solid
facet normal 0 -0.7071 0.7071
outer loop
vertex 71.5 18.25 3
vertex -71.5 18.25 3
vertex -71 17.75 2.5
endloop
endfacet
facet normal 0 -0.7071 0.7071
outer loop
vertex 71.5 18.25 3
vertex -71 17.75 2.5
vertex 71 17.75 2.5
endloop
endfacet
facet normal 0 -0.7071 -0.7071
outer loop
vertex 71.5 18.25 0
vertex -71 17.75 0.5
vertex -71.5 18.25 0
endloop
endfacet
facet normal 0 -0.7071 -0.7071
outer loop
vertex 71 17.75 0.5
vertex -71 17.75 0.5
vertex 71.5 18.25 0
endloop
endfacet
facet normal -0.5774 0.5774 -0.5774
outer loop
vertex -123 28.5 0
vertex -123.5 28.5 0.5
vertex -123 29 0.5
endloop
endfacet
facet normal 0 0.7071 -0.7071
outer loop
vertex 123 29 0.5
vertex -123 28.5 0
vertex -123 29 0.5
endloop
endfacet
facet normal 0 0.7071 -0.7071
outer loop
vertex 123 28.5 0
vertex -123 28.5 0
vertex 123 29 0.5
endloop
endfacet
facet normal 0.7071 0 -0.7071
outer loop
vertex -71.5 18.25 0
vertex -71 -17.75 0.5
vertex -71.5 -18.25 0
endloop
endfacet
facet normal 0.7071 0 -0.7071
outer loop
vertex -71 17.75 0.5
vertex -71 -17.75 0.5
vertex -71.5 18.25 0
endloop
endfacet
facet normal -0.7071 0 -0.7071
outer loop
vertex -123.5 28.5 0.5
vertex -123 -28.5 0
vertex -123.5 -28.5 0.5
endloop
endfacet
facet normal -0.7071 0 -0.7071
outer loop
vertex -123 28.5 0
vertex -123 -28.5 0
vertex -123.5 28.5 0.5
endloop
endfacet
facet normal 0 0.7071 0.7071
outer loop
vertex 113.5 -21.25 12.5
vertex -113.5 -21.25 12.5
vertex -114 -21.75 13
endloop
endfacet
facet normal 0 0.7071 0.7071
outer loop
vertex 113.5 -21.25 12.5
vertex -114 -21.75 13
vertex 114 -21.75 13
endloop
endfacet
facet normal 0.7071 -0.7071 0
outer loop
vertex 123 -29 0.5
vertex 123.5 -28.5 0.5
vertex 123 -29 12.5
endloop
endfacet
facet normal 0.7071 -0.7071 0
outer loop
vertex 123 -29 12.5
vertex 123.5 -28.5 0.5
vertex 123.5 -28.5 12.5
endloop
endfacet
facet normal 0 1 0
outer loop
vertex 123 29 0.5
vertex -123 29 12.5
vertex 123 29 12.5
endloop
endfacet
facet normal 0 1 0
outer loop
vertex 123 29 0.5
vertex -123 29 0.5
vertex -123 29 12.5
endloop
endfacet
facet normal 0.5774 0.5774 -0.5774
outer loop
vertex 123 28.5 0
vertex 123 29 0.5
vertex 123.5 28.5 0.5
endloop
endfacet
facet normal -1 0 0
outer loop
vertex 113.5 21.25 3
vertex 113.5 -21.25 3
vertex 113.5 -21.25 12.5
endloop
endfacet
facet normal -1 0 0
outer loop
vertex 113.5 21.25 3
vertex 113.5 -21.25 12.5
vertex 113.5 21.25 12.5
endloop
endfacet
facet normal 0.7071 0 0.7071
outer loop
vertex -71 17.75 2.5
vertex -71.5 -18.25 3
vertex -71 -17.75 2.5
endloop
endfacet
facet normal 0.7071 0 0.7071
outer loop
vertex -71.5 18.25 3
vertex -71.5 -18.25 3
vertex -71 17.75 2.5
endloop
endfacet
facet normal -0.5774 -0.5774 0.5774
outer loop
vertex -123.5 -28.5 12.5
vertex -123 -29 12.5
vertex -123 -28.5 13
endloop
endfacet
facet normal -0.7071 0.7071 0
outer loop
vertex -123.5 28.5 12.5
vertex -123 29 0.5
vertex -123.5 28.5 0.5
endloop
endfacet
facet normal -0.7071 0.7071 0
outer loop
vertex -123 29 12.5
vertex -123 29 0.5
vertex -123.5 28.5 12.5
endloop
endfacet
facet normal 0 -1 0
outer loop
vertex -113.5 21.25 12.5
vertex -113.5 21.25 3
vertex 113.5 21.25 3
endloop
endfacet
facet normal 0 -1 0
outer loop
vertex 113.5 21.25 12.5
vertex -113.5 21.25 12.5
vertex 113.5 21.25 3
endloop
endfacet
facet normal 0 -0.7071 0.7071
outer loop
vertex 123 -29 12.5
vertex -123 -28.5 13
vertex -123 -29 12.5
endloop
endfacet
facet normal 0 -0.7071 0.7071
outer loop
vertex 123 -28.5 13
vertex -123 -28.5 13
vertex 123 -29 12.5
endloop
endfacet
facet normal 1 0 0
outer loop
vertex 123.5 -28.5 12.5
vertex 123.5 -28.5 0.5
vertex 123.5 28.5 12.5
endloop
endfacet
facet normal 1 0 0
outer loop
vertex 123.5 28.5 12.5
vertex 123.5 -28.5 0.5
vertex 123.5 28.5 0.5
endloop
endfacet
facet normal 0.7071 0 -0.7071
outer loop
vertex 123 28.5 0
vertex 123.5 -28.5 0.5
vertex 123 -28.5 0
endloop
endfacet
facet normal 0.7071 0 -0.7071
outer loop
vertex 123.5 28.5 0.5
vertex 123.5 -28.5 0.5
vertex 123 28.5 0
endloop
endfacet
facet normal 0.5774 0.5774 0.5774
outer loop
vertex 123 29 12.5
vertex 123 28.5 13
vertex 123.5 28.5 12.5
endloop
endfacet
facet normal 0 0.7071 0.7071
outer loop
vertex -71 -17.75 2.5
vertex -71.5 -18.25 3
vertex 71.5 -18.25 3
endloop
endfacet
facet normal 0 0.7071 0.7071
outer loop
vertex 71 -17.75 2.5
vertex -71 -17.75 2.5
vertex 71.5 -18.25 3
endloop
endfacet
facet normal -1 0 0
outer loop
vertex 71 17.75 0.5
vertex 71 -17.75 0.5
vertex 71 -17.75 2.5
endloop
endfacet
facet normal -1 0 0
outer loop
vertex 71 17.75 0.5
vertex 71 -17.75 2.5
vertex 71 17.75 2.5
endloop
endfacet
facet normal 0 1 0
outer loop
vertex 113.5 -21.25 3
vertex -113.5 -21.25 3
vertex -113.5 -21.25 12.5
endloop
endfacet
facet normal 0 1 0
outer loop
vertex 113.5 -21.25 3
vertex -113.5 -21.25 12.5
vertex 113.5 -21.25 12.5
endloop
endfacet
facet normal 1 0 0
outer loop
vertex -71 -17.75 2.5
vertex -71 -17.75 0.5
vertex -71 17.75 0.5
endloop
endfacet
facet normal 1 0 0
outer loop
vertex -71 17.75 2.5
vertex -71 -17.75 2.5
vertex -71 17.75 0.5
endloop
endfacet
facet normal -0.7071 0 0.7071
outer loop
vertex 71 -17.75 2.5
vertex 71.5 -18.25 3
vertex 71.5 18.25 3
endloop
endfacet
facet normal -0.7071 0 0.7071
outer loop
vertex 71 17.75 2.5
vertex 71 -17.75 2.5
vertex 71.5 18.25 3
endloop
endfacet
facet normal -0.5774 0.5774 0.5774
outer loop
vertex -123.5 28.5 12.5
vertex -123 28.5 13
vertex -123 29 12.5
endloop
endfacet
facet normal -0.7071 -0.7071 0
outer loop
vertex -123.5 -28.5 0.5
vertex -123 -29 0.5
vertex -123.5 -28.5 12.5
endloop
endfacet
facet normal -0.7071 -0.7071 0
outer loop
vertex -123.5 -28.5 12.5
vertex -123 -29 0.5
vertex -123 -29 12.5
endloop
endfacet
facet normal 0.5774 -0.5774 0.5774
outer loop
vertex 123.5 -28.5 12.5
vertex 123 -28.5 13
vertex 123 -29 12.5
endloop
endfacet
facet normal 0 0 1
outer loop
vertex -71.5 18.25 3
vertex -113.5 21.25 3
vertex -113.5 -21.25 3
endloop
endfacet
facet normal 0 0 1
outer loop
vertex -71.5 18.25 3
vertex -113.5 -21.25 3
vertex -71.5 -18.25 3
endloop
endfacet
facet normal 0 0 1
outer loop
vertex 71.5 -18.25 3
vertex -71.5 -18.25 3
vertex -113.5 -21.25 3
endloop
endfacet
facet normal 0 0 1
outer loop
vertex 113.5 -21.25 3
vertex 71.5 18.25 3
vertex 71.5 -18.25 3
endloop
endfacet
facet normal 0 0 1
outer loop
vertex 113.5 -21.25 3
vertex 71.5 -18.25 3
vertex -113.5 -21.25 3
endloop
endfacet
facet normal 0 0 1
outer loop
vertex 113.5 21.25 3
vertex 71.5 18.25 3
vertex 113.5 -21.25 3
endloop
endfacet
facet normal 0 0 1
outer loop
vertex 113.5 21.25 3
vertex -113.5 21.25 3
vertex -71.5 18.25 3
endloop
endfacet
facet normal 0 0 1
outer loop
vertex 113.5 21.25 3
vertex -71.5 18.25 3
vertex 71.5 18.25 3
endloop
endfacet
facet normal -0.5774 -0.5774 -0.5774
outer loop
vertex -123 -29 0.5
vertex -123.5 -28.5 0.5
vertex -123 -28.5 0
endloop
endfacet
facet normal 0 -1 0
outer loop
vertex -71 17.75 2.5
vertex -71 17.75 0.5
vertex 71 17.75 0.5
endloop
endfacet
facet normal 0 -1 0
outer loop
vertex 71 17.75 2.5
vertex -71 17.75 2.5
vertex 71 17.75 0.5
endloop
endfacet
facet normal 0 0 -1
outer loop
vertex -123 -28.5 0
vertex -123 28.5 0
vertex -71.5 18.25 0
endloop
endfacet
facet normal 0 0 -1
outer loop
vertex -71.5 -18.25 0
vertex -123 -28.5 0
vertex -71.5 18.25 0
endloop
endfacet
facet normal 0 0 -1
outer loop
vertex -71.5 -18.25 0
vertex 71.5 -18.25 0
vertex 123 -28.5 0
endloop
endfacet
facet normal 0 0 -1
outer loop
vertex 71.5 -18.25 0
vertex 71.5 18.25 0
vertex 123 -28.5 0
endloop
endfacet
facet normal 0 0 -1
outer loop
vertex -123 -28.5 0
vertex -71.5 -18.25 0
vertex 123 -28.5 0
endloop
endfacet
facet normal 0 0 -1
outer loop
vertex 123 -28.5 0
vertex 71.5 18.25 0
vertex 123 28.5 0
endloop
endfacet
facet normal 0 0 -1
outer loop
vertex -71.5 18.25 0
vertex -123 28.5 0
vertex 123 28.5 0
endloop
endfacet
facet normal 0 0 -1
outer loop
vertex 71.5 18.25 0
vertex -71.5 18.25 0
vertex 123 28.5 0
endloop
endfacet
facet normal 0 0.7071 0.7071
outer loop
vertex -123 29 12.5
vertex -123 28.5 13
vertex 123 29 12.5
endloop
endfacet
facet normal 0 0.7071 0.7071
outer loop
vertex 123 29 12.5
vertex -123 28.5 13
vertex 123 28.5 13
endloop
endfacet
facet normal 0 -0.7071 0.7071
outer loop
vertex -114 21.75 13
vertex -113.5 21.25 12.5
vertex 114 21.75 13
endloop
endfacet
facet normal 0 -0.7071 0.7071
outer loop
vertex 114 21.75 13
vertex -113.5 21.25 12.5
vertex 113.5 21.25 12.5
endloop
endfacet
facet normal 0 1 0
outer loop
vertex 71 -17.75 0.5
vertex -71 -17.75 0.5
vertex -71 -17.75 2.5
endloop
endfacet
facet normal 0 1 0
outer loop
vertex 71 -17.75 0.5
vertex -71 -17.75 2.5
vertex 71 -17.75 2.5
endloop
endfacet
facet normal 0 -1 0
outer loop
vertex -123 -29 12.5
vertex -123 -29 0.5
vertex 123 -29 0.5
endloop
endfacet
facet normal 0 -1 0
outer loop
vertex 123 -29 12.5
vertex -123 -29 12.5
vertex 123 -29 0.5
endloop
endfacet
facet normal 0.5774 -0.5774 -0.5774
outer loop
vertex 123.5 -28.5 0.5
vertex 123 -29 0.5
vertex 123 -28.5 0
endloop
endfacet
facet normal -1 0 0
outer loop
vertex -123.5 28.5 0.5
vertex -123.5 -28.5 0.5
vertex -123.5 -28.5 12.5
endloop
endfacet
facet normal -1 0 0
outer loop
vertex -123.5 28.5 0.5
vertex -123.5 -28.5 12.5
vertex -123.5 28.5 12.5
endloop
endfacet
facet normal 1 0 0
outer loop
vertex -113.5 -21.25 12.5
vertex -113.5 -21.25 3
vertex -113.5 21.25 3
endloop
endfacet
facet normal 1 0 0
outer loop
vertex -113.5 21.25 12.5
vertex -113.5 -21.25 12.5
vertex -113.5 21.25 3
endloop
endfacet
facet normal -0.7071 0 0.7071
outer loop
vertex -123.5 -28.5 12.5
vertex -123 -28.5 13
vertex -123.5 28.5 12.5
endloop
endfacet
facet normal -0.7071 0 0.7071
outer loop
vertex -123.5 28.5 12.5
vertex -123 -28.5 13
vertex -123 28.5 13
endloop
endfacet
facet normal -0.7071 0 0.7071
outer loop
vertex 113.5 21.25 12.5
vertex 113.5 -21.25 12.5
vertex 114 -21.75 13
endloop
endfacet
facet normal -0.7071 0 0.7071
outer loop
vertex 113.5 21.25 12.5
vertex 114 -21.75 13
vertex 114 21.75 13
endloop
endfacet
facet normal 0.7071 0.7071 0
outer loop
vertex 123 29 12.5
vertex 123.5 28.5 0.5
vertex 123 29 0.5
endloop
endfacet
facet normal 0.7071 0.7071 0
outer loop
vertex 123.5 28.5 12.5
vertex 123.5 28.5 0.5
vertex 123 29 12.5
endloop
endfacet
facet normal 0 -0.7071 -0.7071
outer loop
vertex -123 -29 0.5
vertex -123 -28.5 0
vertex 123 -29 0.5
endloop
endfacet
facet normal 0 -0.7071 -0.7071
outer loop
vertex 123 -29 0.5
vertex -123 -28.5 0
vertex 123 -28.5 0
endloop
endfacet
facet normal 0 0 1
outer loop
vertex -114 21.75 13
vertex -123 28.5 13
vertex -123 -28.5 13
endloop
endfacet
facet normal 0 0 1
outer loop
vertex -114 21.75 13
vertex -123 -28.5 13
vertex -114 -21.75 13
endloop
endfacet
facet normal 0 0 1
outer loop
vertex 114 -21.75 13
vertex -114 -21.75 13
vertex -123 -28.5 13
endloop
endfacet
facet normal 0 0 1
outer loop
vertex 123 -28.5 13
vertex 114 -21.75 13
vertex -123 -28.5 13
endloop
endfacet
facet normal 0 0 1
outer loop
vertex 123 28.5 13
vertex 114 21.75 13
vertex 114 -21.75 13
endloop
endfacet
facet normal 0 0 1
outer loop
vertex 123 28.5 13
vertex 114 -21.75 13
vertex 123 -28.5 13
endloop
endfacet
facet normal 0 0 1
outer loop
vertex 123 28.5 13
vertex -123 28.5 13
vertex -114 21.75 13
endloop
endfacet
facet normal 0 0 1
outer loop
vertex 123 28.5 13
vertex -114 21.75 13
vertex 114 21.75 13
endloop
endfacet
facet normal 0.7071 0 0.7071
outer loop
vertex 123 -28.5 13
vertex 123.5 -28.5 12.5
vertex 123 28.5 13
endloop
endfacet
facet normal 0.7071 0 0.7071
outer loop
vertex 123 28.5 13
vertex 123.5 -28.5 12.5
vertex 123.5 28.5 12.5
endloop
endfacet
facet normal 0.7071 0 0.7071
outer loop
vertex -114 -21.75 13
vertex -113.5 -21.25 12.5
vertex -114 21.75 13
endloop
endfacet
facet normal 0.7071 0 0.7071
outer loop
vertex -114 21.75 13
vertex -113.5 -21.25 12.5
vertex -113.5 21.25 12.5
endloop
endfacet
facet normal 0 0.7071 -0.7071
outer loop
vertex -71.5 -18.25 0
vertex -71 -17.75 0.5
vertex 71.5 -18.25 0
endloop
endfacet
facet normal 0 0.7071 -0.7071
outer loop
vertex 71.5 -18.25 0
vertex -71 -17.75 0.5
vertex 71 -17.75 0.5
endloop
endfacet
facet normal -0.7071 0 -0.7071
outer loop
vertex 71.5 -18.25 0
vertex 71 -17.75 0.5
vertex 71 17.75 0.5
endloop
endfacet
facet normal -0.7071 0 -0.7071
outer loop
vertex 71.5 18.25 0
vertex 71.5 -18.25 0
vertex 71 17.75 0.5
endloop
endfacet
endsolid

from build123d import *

# Parameters (mm, degrees)
F0_W     = 227
F0_H     = 42.5
F0_W_2   = 142
F0_H_2   = 35.5
F1_DEPTH = 3
F0_W_3   = 247
F0_H_3   = 58
F2_DEPTH = 13
F3_SIZE  = 0.5
F4_SIZE  = 0.5


with BuildPart() as f1:
    # F0 (on Top) → F1 (new body)
    with BuildSketch(Plane.XY):
        Rectangle(F0_W, F0_H)
        Rectangle(F0_W_2, F0_H_2, mode=Mode.SUBTRACT)
    extrude(amount=F1_DEPTH)

    # F0 (on Top) → F2 (join)
    with BuildSketch(Plane.XY):
        Rectangle(F0_W_3, F0_H_3)
        Rectangle(F0_W, F0_H, mode=Mode.SUBTRACT)
    extrude(amount=F2_DEPTH)

    # F3
    f3_edges = [f1.edges().sort_by_distance(p)[0] for p in [
        (-123.5, -29, 6.5),
        (0, -29, 13),
        (123.5, 0, 13),
        (0, 29, 13),
        (-123.5, 0, 13),
        (113.5, 0, 13),
        (0, -21.25, 13),
        (-113.5, 0, 13),
        (0, 21.25, 13),
        (123.5, -29, 6.5),
        (123.5, 29, 6.5),
        (-123.5, 29, 6.5),
        (-123.5, 0, 0),
        (0, -29, 0),
        (0, 29, 0),
        (123.5, 0, 0),
    ]]
    chamfer(f3_edges, length=F3_SIZE)

    # F4
    f4_edges = [f1.edges().sort_by_distance(p)[0] for p in [
        (0, -17.75, 3),
        (-71, 0, 3),
        (0, 17.75, 3),
        (71, 0, 3),
        (0, -17.75, 0),
        (-71, 0, 0),
        (0, 17.75, 0),
        (71, 0, 0),
    ]]
    chamfer(f4_edges, length=F4_SIZE)


solid = f1.part
